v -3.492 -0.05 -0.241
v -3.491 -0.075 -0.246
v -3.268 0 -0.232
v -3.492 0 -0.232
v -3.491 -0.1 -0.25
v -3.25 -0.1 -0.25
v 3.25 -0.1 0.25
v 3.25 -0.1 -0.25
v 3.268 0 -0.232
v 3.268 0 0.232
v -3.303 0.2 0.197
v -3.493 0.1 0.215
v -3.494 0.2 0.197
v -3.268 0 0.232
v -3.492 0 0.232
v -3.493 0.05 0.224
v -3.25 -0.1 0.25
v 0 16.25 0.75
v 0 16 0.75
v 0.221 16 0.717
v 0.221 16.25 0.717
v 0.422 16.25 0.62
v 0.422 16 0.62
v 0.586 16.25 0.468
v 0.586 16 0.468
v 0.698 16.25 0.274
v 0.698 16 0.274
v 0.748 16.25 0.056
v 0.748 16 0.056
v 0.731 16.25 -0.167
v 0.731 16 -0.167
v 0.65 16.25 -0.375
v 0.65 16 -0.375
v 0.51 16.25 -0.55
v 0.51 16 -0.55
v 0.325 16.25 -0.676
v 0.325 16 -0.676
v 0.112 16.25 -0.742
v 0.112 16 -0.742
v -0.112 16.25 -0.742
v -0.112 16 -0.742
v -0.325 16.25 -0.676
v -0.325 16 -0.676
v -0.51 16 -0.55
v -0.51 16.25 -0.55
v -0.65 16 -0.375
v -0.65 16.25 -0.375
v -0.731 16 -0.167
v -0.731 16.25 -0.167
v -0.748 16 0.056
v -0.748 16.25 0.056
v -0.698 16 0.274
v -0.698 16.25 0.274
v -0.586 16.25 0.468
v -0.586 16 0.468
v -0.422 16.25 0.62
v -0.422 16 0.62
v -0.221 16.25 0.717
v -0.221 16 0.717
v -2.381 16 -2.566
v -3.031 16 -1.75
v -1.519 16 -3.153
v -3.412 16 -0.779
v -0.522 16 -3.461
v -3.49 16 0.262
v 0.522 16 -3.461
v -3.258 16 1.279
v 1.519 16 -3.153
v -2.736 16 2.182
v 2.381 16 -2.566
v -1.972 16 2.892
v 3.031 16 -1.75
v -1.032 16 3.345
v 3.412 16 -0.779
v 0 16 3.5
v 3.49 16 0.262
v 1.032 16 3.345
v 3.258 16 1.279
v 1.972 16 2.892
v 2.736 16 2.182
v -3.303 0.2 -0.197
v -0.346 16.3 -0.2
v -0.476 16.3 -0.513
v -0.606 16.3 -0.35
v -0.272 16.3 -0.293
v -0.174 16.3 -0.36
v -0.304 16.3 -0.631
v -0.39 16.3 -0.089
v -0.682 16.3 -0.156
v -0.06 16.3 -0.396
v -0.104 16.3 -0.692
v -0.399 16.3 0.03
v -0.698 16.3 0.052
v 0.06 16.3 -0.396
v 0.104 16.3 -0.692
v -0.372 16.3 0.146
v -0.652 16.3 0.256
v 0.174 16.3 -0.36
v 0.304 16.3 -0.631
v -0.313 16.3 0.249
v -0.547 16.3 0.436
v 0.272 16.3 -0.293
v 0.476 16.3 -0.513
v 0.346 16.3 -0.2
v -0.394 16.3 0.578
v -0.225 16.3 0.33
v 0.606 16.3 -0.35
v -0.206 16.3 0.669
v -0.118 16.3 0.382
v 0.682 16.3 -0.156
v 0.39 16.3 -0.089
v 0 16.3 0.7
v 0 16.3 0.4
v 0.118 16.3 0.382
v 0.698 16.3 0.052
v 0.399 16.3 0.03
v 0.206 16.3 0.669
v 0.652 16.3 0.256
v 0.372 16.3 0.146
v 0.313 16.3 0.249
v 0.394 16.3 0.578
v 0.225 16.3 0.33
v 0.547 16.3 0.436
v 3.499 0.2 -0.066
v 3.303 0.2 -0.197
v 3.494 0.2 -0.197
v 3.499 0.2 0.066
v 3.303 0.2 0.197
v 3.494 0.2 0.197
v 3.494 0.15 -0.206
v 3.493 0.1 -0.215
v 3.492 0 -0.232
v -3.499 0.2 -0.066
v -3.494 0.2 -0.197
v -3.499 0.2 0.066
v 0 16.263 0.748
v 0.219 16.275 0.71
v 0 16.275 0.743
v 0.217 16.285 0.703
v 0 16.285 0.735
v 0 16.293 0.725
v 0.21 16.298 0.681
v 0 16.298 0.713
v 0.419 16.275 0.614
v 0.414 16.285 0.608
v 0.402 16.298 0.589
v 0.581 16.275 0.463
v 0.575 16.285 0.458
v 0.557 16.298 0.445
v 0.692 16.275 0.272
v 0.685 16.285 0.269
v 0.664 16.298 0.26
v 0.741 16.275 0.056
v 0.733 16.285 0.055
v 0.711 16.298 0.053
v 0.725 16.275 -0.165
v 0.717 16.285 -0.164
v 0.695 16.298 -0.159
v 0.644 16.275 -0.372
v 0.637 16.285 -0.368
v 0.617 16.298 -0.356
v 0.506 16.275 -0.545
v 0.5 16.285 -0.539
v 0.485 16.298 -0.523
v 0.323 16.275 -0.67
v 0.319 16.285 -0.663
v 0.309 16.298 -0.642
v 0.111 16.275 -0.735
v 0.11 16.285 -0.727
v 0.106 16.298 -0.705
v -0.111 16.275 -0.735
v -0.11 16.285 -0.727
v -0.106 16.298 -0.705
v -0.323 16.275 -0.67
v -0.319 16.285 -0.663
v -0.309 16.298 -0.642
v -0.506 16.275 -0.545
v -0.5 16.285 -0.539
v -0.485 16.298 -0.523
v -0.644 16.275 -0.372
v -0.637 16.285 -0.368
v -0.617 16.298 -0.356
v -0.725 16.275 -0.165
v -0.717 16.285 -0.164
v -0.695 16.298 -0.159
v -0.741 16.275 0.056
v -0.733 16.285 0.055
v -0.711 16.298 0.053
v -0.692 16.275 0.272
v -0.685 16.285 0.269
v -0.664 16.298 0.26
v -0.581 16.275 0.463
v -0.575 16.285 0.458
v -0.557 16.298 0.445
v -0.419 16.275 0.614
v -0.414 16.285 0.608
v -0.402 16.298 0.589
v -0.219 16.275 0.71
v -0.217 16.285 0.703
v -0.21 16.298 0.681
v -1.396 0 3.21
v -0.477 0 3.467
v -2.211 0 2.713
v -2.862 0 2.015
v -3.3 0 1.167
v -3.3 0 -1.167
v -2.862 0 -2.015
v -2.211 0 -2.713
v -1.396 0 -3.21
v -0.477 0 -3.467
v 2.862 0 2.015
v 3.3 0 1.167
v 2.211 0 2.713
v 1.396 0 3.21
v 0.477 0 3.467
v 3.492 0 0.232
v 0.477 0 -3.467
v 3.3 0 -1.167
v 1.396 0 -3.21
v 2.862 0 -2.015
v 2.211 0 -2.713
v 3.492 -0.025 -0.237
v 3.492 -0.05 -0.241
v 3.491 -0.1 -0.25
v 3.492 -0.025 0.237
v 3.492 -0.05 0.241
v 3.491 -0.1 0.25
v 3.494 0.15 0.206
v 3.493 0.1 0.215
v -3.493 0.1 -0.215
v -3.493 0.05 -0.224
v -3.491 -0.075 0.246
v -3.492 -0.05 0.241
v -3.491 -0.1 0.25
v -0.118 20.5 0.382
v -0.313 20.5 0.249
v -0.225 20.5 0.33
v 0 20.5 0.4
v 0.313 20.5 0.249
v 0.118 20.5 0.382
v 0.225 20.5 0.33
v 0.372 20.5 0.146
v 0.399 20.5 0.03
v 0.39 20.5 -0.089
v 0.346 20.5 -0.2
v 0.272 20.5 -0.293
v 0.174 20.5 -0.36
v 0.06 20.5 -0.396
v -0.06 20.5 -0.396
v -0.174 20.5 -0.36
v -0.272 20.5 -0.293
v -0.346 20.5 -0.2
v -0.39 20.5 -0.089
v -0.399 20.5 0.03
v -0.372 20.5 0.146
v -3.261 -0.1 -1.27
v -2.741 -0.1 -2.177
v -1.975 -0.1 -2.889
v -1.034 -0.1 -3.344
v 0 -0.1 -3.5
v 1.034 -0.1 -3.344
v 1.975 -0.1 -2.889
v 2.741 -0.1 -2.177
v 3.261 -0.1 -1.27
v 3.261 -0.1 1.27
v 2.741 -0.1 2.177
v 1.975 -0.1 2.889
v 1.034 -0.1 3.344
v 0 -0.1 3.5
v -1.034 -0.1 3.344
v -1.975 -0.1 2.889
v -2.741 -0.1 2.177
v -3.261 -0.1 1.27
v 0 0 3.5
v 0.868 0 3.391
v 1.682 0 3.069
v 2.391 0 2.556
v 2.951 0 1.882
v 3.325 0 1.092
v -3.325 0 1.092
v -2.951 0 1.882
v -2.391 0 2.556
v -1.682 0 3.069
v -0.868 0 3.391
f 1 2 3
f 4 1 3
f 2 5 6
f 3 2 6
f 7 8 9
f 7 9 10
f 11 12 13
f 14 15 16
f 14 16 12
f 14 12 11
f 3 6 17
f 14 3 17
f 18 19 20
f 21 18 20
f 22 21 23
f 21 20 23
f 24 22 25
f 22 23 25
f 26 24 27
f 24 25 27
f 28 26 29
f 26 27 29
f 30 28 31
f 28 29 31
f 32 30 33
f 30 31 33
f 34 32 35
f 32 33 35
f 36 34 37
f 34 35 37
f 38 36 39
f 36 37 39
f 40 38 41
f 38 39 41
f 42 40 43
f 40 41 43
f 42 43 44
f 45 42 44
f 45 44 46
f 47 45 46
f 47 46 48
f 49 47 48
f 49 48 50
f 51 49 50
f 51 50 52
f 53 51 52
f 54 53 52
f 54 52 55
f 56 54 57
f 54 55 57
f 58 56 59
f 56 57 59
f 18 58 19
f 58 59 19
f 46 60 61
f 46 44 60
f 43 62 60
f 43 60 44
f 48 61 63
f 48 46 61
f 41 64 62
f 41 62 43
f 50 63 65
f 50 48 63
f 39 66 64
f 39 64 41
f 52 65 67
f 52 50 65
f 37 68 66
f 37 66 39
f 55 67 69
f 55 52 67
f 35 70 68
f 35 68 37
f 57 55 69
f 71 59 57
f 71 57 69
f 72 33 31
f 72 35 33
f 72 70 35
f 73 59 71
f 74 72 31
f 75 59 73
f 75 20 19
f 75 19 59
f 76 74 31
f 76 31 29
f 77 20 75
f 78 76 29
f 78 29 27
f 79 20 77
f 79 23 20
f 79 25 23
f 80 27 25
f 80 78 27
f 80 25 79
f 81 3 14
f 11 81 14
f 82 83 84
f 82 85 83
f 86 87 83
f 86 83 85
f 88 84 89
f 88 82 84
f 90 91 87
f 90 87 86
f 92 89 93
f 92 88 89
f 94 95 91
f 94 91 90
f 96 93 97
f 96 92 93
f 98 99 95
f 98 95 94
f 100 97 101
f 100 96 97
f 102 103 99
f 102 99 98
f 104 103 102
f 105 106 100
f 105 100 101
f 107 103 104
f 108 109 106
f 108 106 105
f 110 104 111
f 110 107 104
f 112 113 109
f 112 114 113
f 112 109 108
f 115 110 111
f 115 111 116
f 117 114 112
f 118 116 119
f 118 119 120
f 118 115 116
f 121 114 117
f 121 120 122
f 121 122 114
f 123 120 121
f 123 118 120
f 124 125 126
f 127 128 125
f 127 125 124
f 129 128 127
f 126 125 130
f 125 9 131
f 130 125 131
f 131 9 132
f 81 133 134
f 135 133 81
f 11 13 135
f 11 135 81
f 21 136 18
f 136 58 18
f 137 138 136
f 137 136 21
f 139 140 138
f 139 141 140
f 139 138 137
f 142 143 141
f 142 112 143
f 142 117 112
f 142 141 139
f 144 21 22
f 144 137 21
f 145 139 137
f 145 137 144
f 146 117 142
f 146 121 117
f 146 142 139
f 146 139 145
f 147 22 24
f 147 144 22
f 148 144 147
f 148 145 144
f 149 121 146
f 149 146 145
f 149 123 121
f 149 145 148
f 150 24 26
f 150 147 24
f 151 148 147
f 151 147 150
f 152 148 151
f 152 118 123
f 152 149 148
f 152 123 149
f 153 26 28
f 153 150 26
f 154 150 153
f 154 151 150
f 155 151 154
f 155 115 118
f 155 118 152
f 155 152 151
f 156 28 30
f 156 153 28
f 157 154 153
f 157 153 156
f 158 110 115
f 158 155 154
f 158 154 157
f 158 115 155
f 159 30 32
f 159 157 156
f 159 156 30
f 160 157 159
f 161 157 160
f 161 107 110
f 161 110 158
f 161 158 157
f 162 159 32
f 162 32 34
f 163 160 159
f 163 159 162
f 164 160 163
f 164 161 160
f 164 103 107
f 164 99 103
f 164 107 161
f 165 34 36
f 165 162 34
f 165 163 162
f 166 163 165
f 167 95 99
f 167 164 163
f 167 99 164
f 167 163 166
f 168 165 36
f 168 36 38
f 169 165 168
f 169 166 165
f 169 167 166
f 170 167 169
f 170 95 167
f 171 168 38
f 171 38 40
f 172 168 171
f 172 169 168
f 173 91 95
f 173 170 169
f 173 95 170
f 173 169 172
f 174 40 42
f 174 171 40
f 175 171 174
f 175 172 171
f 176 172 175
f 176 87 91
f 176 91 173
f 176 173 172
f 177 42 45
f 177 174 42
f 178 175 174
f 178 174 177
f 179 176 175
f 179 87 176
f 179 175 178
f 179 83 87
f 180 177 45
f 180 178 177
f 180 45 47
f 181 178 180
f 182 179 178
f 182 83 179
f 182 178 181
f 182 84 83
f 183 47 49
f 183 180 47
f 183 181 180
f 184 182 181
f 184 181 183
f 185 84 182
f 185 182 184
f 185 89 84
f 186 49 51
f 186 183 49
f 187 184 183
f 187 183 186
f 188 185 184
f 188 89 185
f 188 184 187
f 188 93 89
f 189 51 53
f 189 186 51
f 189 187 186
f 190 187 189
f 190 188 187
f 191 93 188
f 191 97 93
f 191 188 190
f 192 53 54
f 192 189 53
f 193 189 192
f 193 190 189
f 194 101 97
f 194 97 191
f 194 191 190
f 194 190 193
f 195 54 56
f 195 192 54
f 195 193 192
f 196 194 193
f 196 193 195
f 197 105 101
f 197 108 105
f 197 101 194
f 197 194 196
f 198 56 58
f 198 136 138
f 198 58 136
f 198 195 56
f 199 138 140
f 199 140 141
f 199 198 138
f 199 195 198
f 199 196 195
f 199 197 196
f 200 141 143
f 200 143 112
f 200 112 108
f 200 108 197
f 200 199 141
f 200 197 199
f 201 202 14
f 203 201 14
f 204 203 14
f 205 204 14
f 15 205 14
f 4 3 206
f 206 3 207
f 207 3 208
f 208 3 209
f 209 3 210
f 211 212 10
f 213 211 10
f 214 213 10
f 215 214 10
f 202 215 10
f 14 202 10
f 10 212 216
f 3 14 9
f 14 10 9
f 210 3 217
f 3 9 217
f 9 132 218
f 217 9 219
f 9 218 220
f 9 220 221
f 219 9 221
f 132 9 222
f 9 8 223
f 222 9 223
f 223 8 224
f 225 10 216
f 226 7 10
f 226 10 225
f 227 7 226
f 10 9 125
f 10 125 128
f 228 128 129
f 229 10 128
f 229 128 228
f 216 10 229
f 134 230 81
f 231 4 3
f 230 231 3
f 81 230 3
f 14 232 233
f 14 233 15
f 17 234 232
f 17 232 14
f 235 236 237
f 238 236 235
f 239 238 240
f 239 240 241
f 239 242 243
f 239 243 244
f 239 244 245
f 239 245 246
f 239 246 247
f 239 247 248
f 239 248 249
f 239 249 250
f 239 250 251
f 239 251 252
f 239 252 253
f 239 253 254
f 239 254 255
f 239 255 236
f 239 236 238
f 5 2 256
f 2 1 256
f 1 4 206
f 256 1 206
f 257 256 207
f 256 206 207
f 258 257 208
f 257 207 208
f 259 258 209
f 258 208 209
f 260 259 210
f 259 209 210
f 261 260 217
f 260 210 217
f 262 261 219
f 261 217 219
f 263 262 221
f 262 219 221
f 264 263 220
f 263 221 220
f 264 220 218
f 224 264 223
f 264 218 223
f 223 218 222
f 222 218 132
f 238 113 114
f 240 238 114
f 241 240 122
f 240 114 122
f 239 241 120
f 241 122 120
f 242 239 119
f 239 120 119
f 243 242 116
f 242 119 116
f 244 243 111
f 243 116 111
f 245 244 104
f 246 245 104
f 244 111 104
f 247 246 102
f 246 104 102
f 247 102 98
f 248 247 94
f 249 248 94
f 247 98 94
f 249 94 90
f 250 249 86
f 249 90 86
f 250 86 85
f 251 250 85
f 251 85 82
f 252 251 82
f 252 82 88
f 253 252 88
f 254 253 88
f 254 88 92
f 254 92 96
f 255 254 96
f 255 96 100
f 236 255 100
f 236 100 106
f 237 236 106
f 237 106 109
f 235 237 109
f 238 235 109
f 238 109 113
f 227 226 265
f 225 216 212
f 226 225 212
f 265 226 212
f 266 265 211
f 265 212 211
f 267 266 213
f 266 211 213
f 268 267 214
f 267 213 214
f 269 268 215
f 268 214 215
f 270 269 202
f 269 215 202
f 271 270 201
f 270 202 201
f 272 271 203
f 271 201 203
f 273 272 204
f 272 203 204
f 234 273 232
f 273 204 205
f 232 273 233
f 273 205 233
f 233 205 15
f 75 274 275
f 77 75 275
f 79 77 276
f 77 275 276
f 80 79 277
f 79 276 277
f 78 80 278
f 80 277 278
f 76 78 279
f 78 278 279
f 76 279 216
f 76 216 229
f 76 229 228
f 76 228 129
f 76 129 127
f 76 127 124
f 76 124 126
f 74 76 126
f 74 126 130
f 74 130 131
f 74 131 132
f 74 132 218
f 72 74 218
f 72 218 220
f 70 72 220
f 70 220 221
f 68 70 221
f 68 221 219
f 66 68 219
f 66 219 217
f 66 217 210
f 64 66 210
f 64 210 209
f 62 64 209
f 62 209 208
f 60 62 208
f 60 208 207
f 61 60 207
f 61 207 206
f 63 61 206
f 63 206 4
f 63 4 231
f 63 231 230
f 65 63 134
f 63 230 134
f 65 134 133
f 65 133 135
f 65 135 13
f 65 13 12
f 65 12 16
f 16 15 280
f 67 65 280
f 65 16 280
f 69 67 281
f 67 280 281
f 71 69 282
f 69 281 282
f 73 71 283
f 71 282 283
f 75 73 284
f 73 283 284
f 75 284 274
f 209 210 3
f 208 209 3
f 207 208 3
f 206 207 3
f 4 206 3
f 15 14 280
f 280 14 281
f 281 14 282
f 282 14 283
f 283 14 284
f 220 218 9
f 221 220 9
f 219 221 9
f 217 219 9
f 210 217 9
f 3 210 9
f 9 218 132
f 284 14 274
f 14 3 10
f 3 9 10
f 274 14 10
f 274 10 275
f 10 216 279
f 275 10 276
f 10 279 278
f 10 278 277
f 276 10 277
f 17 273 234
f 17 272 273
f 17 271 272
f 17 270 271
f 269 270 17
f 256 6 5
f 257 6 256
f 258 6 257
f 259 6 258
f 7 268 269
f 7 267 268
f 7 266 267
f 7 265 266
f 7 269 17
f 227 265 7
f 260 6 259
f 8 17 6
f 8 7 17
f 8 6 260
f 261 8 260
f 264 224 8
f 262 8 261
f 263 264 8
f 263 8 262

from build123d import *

# Parameters (mm, degrees)
SKETCH_1_R                    = 3.5
EXTRUDE_1_DEPTH               = 16
SKETCH_3_R                    = 0.4
EXTRUDE_2_DEPTH               = 4.5
SKETCH_4_R                    = 0.75
EXTRUDE_3_DEPTH               = 0.3
FILLET_1_R                    = 0.05
SKETCH_5_R                    = 3.5
EXTRUDE_4_DEPTH               = 0.1
SKETCH_6_W                    = 0.5
SKETCH_6_H                    = 0.5
CUT_EXTRUDE_1_DEPTH           = 0.3
CUT_EXTRUDE_1_DRAFT           = -10
CUT_EXTRUDE_1_PROFILE_2_DEPTH = 0.3
CUT_EXTRUDE_1_PROFILE_2_DRAFT = -10


with BuildPart() as part:
    # 草图1 → 凸台-拉伸1 (new body)
    with BuildSketch(Plane(origin=(0, 0, 0), x_dir=(1, 0, 0), z_dir=(0, 1, 0))):
        with Locations(Location((0, 0, 0), (0, 0, 270))):
            Circle(SKETCH_1_R)
    extrude(amount=EXTRUDE_1_DEPTH)

    # 草图3 → 凸台-拉伸2 (add)
    with BuildSketch(Plane(origin=(0, 16, 0), x_dir=(1, 0, 0), z_dir=(0, 1, 0))):
        with Locations(Location((0, 0, 0), (0, 0, 270))):
            Circle(SKETCH_3_R)
    extrude(amount=EXTRUDE_2_DEPTH)

    # 草图4 → 凸台-拉伸3 (add)
    with BuildSketch(Plane(origin=(0, 16, 0), x_dir=(1, 0, 0), z_dir=(0, 1, 0))):
        with Locations(Location((0, 0, 0), (0, 0, 270))):
            Circle(SKETCH_4_R)
    extrude(amount=EXTRUDE_3_DEPTH)

    # 圆角1
    fillet_1_edges = [part.edges().sort_by_distance(p)[0] for p in [
        (0, 16.3, -0.75),
    ]]
    fillet(fillet_1_edges, radius=FILLET_1_R)


with BuildPart() as body_2:
    # 草图5 → 凸台-拉伸4 (new body)
    with BuildSketch(Plane.XZ):
        with Locations(Location((0, 0, 0), (0, 0, 270))):
            Circle(SKETCH_5_R)
    extrude(amount=EXTRUDE_4_DEPTH)


with BuildPart() as cut_extrude_1_tool:
    # 草图6 → 切除-拉伸1 (with draft: the straight prism first)
    with BuildSketch(Plane.XZ.offset(0.1)):
        with Locations((3.5, 0)):
            Rectangle(SKETCH_6_W, SKETCH_6_H)
    extrude(amount=-CUT_EXTRUDE_1_DEPTH)
    # 切除-拉伸1: the draft: its side faces are tilted about the plane it starts from
    cut_extrude_1_sides = [cut_extrude_1_tool.faces().sort_by_distance(p)[0] for p in [
        (3.5, 0.05, 0.25),
        (3.25, 0.05, 0),
        (3.5, 0.05, -0.25),
        (3.75, 0.05, 0),
    ]]
    draft(cut_extrude_1_sides, Plane.XZ.offset(0.1), CUT_EXTRUDE_1_DRAFT)


with BuildPart() as part_1:
    add(part.part)

    # 切除-拉伸1: cut by cut_extrude_1_tool
    add(cut_extrude_1_tool.part, mode=Mode.SUBTRACT)


with BuildPart() as body_2_1:
    add(body_2.part)

    # 切除-拉伸1: cut by cut_extrude_1_tool
    add(cut_extrude_1_tool.part, mode=Mode.SUBTRACT)


with BuildPart() as cut_extrude_1_profile_2_tool:
    # 草图6 → 切除-拉伸1 profile 2 (with draft: the straight prism first)
    with BuildSketch(Plane.XZ.offset(0.1)):
        with Locations((-3.5, 0)):
            Rectangle(SKETCH_6_W, SKETCH_6_H)
    extrude(amount=-CUT_EXTRUDE_1_PROFILE_2_DEPTH)
    # 切除-拉伸1 profile 2: the draft: its side faces are tilted about the plane it starts from
    cut_extrude_1_profile_2_sides = [cut_extrude_1_profile_2_tool.faces().sort_by_distance(p)[0] for p in [
        (-3.5, 0.05, 0.25),
        (-3.75, 0.05, 0),
        (-3.5, 0.05, -0.25),
        (-3.25, 0.05, 0),
    ]]
    draft(cut_extrude_1_profile_2_sides, Plane.XZ.offset(0.1), CUT_EXTRUDE_1_PROFILE_2_DRAFT)


with BuildPart() as part_2:
    add(part_1.part)

    # 切除-拉伸1 profile 2: cut by cut_extrude_1_profile_2_tool
    add(cut_extrude_1_profile_2_tool.part, mode=Mode.SUBTRACT)


with BuildPart() as body_2_2:
    add(body_2_1.part)

    # 切除-拉伸1 profile 2: cut by cut_extrude_1_profile_2_tool
    add(cut_extrude_1_profile_2_tool.part, mode=Mode.SUBTRACT)


solid = Compound([part_2.part, body_2_2.part])
